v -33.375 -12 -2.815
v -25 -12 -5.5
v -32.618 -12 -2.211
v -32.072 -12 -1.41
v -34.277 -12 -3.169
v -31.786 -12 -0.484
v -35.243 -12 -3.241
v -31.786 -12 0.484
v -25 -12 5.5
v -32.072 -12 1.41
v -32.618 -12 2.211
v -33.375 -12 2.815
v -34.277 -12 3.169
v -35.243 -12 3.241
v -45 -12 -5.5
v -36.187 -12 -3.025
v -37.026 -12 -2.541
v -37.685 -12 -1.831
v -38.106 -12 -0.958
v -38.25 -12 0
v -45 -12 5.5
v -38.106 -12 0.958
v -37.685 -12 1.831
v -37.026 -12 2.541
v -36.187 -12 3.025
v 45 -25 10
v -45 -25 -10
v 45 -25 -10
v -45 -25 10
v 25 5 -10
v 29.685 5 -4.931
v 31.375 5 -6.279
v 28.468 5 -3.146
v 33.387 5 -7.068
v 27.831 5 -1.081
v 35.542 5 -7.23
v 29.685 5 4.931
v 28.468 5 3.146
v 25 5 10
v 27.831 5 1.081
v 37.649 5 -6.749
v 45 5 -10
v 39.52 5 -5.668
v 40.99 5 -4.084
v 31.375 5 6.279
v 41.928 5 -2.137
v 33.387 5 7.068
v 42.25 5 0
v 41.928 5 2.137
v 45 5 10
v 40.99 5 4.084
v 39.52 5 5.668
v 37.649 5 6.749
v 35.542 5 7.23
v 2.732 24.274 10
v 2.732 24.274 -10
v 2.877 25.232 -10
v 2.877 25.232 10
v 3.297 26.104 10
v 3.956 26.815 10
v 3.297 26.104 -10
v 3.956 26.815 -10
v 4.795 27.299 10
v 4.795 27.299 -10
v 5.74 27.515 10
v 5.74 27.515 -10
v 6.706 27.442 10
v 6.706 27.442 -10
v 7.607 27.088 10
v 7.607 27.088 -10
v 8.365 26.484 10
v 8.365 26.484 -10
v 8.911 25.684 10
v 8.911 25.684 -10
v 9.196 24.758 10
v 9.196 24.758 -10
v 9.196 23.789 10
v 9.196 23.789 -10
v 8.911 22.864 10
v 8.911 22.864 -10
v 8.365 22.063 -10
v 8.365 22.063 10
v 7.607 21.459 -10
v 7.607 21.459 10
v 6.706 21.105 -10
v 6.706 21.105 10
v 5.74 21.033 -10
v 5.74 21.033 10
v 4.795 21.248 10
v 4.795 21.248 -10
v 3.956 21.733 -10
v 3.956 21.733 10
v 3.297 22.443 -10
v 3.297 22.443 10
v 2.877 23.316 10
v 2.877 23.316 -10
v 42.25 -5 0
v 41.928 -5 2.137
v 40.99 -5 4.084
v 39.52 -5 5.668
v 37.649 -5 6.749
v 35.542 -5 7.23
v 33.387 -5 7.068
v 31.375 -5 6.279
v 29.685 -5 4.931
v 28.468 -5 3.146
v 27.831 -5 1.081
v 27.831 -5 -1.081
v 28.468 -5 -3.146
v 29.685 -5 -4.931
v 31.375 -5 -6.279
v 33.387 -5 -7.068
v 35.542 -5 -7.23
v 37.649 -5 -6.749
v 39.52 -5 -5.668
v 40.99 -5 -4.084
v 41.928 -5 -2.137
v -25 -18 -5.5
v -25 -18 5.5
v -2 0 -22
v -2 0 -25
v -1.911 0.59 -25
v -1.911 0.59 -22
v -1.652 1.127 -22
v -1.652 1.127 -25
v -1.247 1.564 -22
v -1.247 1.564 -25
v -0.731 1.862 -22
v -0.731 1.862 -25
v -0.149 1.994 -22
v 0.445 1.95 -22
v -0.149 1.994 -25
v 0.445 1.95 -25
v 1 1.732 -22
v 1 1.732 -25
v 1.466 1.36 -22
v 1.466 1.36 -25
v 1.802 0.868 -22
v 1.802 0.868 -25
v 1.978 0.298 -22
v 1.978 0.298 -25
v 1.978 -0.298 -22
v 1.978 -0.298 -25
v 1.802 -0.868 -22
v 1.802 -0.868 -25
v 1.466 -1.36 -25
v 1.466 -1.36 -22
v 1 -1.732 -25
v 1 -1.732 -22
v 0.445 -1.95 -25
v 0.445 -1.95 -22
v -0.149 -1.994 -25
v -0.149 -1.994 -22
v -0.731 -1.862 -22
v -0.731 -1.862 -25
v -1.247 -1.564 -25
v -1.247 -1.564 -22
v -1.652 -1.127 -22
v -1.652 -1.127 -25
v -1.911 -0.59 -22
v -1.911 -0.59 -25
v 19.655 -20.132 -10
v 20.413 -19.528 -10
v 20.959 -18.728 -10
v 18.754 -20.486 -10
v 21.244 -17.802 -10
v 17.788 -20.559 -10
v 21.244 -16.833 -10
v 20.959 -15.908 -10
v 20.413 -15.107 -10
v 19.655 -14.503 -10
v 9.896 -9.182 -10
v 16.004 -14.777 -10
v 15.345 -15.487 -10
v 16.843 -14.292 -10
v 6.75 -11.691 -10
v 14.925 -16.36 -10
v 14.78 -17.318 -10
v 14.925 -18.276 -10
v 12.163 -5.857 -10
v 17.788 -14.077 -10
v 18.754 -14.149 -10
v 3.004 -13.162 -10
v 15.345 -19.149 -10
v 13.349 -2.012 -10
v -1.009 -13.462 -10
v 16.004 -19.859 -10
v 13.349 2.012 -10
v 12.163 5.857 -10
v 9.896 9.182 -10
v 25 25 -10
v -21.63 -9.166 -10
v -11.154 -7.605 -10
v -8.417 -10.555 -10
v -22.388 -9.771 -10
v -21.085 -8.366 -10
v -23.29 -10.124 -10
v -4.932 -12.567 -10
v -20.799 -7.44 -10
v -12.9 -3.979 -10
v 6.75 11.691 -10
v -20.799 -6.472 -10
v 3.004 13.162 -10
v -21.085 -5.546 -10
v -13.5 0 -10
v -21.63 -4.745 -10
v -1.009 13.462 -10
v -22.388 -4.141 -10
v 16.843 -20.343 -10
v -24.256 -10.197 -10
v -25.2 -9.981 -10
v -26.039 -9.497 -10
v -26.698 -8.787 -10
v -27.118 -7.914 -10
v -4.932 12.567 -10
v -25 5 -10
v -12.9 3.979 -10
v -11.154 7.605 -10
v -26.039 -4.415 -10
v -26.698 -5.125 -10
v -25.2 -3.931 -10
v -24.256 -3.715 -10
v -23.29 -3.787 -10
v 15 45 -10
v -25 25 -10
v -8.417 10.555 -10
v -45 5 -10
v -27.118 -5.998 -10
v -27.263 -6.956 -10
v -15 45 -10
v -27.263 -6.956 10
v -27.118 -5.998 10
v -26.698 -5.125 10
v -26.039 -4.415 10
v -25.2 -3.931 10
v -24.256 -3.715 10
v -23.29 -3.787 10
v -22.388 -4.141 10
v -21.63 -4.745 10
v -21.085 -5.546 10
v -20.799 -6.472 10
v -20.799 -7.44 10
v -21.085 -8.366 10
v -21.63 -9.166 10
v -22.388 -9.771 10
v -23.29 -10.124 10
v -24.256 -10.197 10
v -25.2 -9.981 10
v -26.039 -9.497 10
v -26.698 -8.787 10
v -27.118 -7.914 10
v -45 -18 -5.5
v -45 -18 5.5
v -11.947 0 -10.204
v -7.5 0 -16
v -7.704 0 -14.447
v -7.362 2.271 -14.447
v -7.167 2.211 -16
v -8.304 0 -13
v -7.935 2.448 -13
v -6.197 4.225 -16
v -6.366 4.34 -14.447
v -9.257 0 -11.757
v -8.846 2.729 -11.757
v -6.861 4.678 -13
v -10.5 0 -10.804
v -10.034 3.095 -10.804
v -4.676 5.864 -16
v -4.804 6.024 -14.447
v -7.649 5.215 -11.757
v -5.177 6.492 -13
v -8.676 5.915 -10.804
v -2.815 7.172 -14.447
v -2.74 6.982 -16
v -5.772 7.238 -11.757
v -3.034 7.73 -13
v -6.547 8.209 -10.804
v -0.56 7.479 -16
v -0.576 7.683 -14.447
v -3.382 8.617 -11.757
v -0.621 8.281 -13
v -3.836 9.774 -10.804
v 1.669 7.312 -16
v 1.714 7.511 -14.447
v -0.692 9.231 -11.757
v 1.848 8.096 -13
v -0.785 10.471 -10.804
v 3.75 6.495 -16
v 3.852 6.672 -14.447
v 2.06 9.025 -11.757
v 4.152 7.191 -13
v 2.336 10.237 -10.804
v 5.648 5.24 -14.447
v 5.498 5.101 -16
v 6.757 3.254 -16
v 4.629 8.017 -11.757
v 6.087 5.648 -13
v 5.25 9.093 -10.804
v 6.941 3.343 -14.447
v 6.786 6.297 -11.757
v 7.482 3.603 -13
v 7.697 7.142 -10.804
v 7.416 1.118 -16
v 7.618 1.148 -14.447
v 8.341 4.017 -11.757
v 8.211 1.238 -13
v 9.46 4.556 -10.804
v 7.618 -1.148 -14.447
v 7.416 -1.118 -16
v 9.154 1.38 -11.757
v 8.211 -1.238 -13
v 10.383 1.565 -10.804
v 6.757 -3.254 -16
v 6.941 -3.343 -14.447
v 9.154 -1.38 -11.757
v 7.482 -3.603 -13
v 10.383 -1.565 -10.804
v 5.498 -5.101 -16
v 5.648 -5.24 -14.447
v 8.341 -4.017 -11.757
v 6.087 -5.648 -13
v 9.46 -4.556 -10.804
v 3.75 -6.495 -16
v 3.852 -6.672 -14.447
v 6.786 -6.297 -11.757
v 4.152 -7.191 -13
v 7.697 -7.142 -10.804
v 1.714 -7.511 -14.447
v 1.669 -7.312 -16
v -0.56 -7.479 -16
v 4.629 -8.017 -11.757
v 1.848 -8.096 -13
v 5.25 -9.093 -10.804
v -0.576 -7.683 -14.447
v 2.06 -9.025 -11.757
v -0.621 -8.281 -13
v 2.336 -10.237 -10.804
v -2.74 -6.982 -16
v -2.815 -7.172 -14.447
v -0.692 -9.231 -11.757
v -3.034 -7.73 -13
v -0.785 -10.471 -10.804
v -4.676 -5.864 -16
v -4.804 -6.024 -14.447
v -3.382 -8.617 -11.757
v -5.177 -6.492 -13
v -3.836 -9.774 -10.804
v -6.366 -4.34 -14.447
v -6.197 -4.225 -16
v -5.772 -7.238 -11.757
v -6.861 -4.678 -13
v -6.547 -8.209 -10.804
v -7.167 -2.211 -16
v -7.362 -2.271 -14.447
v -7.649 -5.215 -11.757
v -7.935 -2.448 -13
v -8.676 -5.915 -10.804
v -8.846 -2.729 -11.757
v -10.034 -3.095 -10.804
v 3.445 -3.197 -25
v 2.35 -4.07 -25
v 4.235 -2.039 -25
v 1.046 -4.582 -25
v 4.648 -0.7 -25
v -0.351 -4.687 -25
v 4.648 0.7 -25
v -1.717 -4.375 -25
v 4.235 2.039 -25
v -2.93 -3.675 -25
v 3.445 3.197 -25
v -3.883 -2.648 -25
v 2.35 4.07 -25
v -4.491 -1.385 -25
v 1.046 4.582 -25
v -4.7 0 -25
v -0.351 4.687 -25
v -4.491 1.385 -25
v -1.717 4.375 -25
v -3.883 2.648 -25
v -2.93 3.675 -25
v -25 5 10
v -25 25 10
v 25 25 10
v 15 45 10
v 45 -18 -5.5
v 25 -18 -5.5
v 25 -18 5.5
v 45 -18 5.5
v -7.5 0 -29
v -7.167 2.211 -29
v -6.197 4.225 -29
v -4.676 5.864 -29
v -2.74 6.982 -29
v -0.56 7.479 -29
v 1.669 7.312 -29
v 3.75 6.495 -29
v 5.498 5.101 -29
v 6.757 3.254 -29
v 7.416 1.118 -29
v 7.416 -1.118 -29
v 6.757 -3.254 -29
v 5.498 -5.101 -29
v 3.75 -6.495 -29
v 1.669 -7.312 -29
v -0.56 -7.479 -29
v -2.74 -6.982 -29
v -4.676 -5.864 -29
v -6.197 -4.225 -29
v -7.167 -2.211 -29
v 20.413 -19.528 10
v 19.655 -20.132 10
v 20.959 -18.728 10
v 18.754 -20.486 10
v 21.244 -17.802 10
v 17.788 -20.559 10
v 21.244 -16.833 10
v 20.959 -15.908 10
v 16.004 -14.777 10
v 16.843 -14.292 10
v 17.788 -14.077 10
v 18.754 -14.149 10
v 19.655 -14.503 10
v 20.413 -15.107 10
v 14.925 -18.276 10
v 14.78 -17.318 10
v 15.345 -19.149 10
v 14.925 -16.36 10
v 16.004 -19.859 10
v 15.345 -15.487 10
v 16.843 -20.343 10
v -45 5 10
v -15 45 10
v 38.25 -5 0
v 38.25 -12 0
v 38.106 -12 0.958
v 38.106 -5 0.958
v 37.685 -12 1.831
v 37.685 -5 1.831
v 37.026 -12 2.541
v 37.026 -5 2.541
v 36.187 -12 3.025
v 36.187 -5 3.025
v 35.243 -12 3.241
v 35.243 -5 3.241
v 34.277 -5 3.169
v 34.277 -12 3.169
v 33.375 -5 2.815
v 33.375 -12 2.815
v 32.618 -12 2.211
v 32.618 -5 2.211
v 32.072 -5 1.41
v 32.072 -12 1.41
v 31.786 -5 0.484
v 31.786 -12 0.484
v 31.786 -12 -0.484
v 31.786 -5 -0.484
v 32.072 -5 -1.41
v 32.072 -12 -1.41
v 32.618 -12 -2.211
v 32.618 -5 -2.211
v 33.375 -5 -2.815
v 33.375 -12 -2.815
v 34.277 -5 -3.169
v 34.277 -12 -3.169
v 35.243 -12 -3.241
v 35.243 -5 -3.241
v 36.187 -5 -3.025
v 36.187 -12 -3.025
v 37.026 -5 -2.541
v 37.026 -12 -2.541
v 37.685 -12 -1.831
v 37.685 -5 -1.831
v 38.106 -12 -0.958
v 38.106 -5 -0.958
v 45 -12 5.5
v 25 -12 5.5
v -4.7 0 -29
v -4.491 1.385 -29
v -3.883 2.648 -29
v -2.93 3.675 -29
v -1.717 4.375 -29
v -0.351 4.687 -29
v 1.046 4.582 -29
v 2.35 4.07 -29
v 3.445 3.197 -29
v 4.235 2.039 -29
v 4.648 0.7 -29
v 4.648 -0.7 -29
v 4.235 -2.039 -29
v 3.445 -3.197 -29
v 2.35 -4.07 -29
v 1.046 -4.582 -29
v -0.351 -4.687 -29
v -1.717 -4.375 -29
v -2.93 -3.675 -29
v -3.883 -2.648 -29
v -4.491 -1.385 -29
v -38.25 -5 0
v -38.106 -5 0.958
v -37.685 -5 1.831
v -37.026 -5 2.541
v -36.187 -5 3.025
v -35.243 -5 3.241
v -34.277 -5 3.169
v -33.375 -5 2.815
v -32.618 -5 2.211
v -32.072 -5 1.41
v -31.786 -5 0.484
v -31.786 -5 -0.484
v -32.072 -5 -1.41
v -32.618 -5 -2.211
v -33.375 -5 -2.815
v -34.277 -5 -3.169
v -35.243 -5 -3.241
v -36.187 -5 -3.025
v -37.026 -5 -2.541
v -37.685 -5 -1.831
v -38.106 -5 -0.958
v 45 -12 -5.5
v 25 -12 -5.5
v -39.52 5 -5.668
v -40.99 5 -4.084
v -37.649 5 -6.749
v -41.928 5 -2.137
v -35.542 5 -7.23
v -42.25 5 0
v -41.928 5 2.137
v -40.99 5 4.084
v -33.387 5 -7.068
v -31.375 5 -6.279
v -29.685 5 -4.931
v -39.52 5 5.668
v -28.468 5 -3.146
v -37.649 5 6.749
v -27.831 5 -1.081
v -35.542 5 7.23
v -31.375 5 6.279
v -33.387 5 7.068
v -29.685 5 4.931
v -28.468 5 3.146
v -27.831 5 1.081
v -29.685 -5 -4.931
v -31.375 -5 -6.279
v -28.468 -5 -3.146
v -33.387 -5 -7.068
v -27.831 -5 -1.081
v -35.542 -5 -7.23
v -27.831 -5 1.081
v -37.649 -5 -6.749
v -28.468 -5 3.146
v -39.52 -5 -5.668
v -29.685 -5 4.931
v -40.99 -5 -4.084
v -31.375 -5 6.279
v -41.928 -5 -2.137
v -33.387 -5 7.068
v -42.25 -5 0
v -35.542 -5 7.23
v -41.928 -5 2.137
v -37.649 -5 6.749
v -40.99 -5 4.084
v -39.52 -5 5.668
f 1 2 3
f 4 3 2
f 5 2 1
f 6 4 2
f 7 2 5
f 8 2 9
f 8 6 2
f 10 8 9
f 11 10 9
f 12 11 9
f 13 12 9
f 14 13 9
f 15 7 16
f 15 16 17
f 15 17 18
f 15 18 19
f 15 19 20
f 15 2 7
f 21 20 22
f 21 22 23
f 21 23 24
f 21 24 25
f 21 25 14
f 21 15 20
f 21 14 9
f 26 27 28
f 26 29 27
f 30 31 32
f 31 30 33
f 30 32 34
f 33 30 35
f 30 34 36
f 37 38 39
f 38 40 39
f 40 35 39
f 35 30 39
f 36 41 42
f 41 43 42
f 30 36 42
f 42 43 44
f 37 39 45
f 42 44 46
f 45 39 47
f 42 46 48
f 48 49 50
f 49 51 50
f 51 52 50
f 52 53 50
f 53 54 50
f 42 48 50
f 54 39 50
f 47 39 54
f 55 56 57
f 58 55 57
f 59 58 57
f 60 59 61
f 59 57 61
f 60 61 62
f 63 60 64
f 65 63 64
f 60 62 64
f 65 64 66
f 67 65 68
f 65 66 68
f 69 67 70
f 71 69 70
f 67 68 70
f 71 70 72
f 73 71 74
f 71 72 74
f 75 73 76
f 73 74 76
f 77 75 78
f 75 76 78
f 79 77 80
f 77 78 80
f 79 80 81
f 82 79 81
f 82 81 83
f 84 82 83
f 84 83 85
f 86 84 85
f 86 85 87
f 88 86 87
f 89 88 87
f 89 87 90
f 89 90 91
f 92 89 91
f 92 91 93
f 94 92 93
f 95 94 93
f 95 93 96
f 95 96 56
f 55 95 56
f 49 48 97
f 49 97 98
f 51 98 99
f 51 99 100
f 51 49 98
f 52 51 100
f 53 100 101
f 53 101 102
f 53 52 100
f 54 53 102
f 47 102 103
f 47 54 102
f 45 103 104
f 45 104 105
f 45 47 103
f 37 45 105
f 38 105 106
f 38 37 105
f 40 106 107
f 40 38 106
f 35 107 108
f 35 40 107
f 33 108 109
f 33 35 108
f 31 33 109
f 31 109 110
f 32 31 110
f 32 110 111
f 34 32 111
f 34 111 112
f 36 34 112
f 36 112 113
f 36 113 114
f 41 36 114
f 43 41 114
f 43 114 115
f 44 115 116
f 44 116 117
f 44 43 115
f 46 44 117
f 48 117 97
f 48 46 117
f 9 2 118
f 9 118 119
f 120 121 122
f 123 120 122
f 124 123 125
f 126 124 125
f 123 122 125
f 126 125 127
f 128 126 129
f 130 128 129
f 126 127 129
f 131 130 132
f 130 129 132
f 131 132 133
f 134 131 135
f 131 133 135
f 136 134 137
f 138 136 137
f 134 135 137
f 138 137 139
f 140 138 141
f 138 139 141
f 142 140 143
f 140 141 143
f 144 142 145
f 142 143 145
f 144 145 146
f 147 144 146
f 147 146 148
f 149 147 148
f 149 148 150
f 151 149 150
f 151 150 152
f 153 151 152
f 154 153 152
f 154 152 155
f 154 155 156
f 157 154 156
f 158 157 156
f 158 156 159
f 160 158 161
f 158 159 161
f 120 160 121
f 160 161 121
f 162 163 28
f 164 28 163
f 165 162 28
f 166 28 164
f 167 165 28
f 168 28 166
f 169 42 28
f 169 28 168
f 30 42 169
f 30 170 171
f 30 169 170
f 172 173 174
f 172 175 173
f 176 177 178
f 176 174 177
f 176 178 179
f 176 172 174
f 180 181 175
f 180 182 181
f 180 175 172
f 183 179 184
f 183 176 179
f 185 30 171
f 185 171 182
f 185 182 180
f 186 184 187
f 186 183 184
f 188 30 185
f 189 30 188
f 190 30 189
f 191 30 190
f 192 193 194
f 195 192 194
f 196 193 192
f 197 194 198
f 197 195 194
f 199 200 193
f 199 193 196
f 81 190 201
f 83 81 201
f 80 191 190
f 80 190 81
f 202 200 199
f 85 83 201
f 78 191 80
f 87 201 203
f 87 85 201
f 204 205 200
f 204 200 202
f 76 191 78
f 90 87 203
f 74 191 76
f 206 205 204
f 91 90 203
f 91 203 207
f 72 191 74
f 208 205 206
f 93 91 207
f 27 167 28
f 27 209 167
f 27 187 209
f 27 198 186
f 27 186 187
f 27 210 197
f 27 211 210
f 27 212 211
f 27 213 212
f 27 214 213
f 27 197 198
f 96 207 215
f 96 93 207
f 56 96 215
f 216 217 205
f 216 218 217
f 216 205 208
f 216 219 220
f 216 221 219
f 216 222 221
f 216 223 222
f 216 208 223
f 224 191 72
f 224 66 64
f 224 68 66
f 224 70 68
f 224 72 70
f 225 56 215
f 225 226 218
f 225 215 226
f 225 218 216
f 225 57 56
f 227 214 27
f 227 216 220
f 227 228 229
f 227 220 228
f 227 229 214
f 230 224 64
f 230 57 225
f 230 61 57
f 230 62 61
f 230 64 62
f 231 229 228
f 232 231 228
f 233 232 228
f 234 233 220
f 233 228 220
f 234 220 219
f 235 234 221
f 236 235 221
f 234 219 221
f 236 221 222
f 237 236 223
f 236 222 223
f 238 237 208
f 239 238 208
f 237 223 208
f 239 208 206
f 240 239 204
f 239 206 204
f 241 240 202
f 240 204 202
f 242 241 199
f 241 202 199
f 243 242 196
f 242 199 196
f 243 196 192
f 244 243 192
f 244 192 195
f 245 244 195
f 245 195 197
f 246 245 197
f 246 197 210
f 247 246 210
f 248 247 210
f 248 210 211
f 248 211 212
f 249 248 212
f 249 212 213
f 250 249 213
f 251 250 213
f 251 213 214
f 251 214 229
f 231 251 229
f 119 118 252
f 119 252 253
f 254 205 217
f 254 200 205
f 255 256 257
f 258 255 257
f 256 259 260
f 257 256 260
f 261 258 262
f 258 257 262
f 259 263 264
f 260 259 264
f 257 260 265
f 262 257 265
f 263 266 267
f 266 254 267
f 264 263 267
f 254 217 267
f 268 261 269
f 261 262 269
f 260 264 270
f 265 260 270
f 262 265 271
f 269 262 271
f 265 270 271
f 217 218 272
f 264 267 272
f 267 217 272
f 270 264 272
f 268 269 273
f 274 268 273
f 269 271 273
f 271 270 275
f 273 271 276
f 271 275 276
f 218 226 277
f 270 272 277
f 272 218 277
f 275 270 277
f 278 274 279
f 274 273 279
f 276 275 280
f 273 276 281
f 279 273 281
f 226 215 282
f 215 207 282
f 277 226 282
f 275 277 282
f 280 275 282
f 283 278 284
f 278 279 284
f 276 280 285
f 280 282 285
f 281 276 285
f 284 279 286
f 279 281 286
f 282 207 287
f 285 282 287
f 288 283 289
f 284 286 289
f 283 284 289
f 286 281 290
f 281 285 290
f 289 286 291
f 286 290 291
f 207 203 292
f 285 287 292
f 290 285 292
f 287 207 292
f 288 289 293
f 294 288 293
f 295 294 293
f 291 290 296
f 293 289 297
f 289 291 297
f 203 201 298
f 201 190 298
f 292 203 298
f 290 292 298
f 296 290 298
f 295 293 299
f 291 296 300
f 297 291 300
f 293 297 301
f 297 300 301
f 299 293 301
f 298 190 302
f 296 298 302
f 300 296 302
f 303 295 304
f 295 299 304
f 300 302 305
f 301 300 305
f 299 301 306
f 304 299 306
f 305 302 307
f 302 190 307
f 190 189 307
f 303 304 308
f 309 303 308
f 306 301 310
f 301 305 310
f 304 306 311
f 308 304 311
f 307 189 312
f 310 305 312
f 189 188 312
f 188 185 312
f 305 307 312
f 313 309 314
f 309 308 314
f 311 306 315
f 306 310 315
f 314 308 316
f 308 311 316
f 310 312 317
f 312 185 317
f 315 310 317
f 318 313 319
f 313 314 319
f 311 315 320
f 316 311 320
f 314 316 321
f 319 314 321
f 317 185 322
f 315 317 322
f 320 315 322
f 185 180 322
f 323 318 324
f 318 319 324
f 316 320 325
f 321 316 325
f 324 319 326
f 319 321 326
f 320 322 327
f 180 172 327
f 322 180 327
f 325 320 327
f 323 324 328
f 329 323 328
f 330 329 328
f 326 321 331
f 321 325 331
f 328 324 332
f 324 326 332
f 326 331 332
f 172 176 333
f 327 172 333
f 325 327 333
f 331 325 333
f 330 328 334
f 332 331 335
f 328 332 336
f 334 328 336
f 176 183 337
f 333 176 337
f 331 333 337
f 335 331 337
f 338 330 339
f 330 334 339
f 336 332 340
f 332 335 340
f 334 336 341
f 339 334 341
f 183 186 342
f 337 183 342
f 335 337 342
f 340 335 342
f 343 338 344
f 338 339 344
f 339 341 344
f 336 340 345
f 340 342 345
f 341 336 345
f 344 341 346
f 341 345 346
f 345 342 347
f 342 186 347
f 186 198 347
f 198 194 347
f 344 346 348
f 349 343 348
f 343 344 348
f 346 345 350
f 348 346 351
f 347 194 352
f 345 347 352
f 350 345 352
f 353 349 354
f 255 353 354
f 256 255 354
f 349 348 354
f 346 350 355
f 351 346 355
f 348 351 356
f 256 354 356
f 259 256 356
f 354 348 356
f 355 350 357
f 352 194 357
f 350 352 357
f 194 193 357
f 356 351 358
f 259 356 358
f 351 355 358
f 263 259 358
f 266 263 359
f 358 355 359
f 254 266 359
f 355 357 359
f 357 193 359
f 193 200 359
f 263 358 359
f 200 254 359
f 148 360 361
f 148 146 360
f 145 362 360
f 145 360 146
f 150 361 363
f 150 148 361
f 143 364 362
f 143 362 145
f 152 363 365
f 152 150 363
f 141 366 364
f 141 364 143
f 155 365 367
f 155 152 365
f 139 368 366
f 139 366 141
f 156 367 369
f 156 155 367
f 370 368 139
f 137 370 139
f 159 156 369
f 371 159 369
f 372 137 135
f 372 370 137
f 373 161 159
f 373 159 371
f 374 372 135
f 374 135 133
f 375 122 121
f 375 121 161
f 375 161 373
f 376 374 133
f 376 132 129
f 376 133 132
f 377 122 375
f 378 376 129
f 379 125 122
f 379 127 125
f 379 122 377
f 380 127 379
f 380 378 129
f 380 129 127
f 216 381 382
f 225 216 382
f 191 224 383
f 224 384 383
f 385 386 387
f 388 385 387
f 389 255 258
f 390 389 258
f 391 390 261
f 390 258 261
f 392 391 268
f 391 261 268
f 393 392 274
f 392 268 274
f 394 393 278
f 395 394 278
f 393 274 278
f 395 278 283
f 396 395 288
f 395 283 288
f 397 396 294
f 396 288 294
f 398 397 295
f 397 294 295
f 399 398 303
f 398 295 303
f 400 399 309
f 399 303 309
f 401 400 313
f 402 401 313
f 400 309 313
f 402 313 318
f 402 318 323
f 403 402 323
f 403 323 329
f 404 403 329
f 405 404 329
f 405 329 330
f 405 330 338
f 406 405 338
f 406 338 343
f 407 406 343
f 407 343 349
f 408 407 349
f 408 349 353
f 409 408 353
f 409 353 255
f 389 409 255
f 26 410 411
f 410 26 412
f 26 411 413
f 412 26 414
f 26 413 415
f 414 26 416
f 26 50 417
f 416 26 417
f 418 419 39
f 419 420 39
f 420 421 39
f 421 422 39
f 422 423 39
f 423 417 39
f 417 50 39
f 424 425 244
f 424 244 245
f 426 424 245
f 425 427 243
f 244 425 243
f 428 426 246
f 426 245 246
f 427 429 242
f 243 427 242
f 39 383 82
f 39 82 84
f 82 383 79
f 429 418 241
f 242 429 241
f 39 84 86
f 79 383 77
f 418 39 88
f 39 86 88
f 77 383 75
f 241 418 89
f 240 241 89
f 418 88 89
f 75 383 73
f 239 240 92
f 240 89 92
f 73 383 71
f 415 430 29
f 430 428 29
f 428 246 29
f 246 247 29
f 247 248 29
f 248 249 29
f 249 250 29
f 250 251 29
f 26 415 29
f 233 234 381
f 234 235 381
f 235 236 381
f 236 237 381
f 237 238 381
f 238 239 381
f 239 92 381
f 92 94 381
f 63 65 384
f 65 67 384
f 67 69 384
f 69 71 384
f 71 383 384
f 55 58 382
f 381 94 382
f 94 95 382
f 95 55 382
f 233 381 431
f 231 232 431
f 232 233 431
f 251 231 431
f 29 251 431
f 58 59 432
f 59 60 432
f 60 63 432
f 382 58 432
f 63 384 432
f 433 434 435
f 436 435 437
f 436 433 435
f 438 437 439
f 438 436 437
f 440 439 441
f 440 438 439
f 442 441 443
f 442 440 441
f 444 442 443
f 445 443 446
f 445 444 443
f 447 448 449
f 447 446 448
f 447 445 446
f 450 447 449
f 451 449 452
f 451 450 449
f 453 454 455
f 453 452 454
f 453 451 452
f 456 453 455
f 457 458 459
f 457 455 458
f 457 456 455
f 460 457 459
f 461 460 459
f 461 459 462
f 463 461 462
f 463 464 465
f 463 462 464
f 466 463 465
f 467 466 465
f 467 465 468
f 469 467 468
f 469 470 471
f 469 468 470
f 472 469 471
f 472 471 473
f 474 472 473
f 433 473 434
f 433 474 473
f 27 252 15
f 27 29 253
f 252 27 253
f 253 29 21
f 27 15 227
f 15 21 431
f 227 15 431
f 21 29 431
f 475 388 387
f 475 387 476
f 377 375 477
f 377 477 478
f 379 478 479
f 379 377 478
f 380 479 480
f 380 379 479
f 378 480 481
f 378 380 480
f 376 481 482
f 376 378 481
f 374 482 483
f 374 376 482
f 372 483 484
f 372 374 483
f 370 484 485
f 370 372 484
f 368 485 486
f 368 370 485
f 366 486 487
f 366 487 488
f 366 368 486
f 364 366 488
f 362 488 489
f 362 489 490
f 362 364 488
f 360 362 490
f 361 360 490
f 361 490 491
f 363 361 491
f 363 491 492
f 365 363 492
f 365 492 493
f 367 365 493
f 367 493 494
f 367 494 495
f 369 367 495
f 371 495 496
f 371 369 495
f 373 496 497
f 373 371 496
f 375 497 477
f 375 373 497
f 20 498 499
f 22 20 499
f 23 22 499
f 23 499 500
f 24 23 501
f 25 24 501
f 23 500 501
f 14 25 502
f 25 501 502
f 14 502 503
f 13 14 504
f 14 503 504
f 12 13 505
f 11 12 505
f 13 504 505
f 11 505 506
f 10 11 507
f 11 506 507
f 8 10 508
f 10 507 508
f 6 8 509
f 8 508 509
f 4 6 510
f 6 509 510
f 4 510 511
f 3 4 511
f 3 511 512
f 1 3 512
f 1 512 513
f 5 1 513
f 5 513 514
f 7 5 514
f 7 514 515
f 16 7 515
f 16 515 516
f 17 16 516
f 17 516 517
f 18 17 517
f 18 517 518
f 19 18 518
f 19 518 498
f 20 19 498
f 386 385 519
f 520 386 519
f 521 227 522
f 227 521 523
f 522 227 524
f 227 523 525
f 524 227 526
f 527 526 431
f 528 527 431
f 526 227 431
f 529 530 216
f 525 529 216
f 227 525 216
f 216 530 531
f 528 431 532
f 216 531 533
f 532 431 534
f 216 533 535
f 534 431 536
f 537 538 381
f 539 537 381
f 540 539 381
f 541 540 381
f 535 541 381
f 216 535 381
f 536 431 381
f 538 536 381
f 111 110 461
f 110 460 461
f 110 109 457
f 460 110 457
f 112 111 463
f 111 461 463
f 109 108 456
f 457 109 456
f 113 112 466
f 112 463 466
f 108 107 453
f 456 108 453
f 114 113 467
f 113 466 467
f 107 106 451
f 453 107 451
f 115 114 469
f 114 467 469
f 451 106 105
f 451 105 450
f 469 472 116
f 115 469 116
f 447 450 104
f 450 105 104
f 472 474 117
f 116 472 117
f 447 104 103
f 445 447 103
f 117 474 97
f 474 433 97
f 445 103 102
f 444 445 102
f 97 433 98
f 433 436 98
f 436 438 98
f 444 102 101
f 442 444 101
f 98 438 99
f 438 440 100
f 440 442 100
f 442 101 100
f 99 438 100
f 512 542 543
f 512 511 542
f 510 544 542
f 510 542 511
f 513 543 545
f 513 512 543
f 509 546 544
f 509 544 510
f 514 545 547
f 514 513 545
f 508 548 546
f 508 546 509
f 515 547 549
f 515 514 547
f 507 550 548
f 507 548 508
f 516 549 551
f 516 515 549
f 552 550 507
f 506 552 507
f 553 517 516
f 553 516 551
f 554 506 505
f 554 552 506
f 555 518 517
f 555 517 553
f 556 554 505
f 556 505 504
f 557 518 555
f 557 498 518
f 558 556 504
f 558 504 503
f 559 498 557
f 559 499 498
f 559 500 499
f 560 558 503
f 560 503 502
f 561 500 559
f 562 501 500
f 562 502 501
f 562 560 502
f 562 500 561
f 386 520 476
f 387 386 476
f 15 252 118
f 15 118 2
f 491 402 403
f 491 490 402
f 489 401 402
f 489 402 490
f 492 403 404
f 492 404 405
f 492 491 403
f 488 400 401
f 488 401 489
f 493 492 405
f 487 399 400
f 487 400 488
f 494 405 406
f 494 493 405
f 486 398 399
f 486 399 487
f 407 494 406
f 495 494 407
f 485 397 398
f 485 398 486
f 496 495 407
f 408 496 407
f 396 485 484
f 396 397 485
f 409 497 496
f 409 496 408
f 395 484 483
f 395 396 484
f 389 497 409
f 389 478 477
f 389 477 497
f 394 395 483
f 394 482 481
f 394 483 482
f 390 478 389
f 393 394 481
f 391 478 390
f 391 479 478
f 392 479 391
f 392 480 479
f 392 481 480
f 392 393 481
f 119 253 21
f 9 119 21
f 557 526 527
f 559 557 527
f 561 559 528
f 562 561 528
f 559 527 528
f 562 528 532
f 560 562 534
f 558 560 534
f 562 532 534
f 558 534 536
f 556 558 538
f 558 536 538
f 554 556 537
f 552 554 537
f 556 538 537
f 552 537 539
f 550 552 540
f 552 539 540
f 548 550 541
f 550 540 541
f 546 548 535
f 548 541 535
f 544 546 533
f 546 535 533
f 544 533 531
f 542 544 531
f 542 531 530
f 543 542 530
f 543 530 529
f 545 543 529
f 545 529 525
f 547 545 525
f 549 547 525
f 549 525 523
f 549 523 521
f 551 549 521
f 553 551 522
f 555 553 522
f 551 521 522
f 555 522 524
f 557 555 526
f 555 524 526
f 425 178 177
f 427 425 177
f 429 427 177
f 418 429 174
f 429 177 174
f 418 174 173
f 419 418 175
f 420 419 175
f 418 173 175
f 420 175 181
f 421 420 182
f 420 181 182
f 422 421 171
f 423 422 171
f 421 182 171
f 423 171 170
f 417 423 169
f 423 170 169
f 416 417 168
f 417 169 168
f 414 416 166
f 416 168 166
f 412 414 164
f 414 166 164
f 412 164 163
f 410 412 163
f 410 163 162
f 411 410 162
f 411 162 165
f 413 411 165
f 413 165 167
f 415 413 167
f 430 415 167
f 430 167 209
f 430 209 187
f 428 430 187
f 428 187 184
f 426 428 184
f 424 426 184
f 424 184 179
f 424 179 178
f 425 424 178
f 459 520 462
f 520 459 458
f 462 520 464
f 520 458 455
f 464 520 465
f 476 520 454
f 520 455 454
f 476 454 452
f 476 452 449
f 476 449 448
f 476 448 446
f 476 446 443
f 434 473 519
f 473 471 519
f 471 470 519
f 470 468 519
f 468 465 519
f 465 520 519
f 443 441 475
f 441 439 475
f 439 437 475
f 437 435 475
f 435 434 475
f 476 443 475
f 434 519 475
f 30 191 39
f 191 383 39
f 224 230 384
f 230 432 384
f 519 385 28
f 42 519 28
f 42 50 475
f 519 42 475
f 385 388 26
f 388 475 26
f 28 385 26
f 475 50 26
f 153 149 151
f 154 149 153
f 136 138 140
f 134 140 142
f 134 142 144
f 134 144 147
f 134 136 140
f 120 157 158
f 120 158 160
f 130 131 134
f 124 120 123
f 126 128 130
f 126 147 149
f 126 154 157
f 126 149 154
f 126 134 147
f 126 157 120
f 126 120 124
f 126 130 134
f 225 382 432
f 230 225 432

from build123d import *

# Parameters (mm, degrees)
BODY_DEPTH             = 10
SKETCH14_R             = 7.5
BEARING_SUPPORT_DEPTH  = 15
SKETCH15_R             = 7.5
SKETCH15_R_2           = 4.7
BEARING_PLACE_DEPTH    = 4
SKETCH16_R             = 2
MOTOR_SHAFT_HOLE_DEPTH = 3
FILLET1_R              = 6
SKETCH17_R             = 7.25
SPRING_HOLE_DEPTH      = 10
SKETCH18_W             = 11
SKETCH18_H             = 6
NUT_HOLE_DEPTH         = 20
SKETCH19_R             = 3.25
SHAFT_HOLE_DEPTH       = 13
SKETCH20_R             = 3.25
BRAKE_DISK_HOLES_DEPTH = 67.708320321


with BuildPart() as part:
    # Sketch1 → Body (new, symmetric)
    with BuildSketch(Plane.XY):
        Polygon((-25, 25), (-15, 45), (15, 45), (25, 25), (25, 5), (45, 5), (45, -25), (25, -25), (-25, -25), (-45, -25), (-45, 5), (-25, 5), align=None)
    extrude(amount=BODY_DEPTH, both=True)

    # Sketch14 → Bearing_Support (add)
    with BuildSketch(Plane(origin=(0, 0, -10), x_dir=(-1, 0, 0), z_dir=(0, 0, -1))):
        Circle(SKETCH14_R)
    extrude(amount=BEARING_SUPPORT_DEPTH)

    # Sketch15 → Bearing_Place (add)
    with BuildSketch(Plane(origin=(0, 0, -25), x_dir=(-1, 0, 0), z_dir=(0, 0, -1))):
        Circle(SKETCH15_R)
        Circle(SKETCH15_R_2, mode=Mode.SUBTRACT)
    extrude(amount=BEARING_PLACE_DEPTH)

    # Sketch16 → Motor_Shaft_Hole (cut)
    with BuildSketch(Plane(origin=(0, 0, -25), x_dir=(-1, 0, 0), z_dir=(0, 0, -1))):
        Circle(SKETCH16_R)
    extrude(amount=-MOTOR_SHAFT_HOLE_DEPTH, mode=Mode.SUBTRACT)

    # Fillet1
    fillet1_edges = [part.edges().sort_by_distance(p)[0] for p in [
        (7.5, 0, -10),
    ]]
    fillet(fillet1_edges, radius=FILLET1_R)

    # Sketch17 → Spring_Hole (cut)
    with BuildSketch(Plane(origin=(0, 5, 0), x_dir=(1, 0, 0), z_dir=(0, 1, 0))):
        with Locations(Location((-35, 0, 0), (0, 0, 180))):
            Circle(SKETCH17_R)
    spring_hole = extrude(amount=-SPRING_HOLE_DEPTH, mode=Mode.SUBTRACT)

    # Sketch18 → Nut_Hole (cut)
    with BuildSketch(Plane.ZY.offset(45)):
        with Locations((0, -15)):
            Rectangle(SKETCH18_W, SKETCH18_H)
    nut_hole = extrude(amount=-NUT_HOLE_DEPTH, mode=Mode.SUBTRACT)

    # Sketch19 → Shaft_Hole (cut)
    with BuildSketch(Plane(origin=(0, -5, 0), x_dir=(1, 0, 0), z_dir=(0, 1, 0))):
        with Locations(Location((-35, 0, 0), (0, 0, 180))):
            Circle(SKETCH19_R)
    shaft_hole = extrude(amount=-SHAFT_HOLE_DEPTH, mode=Mode.SUBTRACT)

    # Mirror1: Spring_Hole, Nut_Hole, Shaft_Hole across plane
    add(spring_hole.mirror(Plane(origin=(0, 0, 0), x_dir=(0, 0, 1), z_dir=(1, 0, 0))), mode=Mode.SUBTRACT)
    add(nut_hole.mirror(Plane(origin=(0, 0, 0), x_dir=(0, 0, 1), z_dir=(1, 0, 0))), mode=Mode.SUBTRACT)
    add(shaft_hole.mirror(Plane(origin=(0, 0, 0), x_dir=(0, 0, 1), z_dir=(1, 0, 0))), mode=Mode.SUBTRACT)

    # Sketch20 → Brake_Disk_Holes (cut, through all)
    with BuildSketch(Plane(origin=(0, 0, -10), x_dir=(-1, 0, 0), z_dir=(0, 0, -1))):
        with Locations((-5.98239088, 24.273668848)):
            Circle(SKETCH20_R)
        with Locations((24.012809306, -6.955931947)):
            Circle(SKETCH20_R)
        with Locations((-18.030418426, -17.317736902)):
            Circle(SKETCH20_R)
    extrude(amount=-BRAKE_DISK_HOLES_DEPTH, mode=Mode.SUBTRACT)


solid = part.part
